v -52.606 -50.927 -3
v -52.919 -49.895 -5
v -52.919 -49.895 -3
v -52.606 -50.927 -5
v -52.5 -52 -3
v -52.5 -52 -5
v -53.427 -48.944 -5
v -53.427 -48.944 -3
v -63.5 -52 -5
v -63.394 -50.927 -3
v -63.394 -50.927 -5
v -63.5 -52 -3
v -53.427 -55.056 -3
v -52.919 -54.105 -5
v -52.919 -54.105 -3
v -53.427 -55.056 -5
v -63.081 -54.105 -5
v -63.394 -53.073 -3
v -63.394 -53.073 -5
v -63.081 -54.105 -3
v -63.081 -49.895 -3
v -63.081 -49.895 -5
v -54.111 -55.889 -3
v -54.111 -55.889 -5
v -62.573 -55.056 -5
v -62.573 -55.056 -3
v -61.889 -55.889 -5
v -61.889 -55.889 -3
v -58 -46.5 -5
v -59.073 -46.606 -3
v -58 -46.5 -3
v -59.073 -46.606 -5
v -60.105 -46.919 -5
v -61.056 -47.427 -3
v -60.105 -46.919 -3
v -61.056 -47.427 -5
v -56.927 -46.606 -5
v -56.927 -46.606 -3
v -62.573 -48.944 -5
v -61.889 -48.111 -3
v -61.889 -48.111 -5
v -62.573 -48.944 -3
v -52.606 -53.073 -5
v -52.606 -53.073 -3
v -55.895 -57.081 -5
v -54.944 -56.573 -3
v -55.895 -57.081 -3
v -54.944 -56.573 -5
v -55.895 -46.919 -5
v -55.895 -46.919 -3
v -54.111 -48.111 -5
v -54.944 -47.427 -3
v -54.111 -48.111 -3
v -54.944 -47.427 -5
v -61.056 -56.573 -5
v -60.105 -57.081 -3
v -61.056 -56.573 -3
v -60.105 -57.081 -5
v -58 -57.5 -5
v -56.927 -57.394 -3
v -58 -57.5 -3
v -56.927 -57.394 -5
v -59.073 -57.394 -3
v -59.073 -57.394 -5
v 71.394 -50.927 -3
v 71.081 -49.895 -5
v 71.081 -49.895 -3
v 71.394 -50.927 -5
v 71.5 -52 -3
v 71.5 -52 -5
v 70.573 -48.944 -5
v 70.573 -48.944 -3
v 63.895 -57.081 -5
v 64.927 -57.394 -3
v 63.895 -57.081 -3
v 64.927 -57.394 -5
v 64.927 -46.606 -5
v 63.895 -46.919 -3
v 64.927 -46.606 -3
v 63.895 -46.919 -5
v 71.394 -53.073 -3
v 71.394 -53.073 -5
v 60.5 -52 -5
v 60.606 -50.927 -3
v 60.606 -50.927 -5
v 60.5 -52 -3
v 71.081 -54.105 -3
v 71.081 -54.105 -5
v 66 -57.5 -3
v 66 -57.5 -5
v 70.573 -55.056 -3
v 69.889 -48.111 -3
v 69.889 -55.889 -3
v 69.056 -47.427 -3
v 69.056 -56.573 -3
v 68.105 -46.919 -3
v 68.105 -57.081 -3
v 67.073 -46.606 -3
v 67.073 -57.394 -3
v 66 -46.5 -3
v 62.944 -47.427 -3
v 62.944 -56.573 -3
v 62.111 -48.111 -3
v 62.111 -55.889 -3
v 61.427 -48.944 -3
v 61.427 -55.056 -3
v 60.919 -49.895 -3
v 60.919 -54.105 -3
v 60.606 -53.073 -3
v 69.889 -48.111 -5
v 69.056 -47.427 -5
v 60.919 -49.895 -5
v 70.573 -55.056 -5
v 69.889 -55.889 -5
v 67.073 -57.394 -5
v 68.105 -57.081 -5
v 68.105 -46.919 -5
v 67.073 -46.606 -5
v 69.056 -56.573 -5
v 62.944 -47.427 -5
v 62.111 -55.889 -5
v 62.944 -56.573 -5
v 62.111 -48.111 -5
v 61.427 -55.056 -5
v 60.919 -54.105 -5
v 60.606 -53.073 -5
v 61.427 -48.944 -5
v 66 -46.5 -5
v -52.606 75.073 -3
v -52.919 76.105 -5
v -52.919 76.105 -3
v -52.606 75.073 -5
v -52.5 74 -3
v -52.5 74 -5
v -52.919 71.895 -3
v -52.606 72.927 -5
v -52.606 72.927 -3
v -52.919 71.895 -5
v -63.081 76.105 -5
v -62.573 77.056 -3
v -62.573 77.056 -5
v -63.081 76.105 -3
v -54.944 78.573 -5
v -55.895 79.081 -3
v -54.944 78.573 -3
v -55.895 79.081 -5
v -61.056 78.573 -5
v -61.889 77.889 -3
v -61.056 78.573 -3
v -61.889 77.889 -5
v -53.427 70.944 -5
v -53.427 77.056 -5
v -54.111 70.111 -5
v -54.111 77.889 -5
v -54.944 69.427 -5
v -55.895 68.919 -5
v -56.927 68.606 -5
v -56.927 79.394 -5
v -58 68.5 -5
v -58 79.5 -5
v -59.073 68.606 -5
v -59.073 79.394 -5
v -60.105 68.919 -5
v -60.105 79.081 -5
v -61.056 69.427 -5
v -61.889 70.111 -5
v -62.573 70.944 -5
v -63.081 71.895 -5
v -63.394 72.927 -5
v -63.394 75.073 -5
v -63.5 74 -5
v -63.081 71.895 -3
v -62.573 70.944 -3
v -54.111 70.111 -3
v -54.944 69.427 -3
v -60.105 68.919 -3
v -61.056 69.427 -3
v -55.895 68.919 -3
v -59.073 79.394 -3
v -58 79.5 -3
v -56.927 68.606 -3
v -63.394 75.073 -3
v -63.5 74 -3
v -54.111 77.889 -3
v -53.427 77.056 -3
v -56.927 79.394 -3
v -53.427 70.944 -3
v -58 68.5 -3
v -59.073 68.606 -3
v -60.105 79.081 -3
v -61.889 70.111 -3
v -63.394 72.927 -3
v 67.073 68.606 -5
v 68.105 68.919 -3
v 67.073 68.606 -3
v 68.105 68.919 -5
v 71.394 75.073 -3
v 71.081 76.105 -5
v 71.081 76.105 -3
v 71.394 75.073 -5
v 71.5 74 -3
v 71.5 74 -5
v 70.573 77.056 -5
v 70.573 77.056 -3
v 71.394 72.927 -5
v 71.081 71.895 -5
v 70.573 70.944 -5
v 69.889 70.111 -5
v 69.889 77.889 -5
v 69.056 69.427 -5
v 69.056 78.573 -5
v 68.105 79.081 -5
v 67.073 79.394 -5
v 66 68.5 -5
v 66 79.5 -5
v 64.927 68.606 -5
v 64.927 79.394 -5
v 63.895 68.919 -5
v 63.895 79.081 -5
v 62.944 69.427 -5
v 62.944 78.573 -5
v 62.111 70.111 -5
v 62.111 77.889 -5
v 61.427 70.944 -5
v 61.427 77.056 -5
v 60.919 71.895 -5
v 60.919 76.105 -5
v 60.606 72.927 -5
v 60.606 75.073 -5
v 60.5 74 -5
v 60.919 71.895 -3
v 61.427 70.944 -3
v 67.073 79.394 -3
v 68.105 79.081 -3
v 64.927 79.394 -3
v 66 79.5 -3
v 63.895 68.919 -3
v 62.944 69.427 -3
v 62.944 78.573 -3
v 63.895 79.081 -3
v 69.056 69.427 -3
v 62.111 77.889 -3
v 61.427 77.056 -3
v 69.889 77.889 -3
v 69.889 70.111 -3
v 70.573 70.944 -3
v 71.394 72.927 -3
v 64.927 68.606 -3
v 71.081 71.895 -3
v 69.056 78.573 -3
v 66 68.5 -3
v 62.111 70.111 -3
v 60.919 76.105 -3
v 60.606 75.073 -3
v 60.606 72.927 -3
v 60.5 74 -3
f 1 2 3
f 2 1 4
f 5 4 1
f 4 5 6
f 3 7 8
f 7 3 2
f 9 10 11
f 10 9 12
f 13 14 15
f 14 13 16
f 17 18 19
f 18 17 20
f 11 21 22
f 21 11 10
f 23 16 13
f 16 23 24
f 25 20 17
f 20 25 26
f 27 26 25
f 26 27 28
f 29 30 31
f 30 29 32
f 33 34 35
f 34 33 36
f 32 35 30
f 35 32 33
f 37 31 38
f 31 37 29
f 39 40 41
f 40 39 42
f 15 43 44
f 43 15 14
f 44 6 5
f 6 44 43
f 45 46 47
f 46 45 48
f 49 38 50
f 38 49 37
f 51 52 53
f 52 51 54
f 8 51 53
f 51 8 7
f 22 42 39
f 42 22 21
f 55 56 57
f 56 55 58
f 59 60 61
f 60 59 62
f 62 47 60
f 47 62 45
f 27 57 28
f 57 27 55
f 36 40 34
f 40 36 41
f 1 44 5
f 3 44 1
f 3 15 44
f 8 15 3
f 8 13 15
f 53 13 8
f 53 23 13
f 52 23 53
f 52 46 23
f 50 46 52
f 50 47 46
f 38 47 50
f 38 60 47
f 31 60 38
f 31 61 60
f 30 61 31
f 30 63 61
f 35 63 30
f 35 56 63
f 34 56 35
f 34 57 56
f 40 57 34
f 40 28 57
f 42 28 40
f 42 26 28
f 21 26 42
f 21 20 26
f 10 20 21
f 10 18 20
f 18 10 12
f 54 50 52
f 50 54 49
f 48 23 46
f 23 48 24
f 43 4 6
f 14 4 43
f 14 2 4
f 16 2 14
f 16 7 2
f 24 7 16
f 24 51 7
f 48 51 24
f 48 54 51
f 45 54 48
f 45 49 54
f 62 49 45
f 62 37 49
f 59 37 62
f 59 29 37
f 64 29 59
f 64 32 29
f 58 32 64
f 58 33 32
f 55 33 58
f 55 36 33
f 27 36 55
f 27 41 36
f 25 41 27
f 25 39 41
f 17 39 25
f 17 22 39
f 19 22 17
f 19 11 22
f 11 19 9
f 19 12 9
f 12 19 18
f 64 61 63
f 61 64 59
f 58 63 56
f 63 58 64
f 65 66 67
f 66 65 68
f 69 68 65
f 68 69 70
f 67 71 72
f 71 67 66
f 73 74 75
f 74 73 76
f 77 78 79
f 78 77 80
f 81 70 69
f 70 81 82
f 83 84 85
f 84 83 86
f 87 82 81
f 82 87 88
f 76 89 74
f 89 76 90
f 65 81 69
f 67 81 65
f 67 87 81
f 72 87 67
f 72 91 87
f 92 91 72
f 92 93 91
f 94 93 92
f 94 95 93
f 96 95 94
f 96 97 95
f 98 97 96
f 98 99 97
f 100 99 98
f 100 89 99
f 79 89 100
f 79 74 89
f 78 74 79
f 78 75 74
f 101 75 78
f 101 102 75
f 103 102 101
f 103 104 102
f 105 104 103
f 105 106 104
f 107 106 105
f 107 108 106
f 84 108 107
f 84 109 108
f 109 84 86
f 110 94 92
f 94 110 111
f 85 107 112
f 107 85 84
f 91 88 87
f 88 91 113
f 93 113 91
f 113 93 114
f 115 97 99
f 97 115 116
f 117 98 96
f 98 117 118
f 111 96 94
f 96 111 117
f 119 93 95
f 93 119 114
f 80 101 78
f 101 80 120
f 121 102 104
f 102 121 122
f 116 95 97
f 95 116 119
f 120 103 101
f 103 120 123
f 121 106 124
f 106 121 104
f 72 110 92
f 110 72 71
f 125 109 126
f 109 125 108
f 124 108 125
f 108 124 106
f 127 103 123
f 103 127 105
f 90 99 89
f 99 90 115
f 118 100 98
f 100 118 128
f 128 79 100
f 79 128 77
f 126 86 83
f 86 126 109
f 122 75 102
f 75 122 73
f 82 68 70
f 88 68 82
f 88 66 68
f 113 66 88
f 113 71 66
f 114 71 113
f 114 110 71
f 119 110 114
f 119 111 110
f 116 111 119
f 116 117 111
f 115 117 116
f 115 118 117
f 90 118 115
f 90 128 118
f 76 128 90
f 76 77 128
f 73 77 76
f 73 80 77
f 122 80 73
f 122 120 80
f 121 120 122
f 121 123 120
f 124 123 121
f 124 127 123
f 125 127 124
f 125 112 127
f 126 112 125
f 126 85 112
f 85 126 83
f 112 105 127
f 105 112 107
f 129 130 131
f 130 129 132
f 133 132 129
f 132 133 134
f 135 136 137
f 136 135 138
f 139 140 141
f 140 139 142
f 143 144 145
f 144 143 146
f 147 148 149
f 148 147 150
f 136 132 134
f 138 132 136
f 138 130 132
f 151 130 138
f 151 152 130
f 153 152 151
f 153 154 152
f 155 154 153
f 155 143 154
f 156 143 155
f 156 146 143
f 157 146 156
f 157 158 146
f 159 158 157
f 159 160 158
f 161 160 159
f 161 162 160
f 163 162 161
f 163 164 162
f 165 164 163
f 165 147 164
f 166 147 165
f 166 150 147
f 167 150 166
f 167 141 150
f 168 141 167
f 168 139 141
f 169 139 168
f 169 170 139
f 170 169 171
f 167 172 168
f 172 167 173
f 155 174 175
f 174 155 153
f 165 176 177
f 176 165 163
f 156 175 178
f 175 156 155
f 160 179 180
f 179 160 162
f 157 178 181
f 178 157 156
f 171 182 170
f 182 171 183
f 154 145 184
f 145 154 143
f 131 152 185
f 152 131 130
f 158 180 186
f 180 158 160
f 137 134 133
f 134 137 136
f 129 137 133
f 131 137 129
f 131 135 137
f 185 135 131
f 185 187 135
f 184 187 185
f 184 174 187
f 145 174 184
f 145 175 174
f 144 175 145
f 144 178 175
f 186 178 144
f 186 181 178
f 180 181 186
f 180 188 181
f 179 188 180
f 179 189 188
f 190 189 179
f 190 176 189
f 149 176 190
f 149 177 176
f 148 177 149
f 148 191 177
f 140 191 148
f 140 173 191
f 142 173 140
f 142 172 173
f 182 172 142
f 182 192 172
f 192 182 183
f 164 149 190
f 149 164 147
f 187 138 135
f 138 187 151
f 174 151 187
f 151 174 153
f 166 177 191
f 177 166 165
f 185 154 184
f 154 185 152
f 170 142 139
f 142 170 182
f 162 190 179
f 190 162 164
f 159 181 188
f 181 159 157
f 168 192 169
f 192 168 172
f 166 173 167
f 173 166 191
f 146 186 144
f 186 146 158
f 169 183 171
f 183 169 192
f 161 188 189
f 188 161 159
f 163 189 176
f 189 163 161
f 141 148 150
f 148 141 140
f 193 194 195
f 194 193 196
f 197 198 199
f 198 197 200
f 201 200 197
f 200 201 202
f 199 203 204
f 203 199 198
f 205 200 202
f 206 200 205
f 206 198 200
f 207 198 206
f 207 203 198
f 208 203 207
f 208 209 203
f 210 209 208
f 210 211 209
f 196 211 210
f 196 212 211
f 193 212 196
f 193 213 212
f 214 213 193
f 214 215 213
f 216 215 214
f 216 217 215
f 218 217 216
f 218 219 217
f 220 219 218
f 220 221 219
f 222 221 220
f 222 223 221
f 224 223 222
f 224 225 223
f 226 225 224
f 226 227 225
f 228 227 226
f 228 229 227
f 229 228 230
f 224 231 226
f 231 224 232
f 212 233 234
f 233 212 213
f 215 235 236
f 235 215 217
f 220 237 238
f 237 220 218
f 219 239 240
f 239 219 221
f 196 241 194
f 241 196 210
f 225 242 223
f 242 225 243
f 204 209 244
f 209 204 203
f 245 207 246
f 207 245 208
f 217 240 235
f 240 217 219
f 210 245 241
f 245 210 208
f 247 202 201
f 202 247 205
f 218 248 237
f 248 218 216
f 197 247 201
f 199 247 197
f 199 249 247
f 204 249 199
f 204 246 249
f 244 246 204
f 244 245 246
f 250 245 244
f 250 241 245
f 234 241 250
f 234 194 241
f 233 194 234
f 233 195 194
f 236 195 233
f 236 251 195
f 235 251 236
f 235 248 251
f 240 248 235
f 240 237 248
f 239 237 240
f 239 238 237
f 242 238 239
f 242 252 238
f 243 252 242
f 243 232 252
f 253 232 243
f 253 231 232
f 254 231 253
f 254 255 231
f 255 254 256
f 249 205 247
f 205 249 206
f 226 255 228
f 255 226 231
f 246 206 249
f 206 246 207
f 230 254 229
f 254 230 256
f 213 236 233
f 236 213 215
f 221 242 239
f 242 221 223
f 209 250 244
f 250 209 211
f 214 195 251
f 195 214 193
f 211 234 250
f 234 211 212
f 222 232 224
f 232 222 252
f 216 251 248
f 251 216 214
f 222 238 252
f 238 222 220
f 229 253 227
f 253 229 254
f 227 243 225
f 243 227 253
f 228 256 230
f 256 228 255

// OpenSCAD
for(p=[[-58,-52],[66,-52],[-58,74],[66,74]]) translate([p[0],p[1],-5]) cylinder(h=2,d=11,$fn=32);
